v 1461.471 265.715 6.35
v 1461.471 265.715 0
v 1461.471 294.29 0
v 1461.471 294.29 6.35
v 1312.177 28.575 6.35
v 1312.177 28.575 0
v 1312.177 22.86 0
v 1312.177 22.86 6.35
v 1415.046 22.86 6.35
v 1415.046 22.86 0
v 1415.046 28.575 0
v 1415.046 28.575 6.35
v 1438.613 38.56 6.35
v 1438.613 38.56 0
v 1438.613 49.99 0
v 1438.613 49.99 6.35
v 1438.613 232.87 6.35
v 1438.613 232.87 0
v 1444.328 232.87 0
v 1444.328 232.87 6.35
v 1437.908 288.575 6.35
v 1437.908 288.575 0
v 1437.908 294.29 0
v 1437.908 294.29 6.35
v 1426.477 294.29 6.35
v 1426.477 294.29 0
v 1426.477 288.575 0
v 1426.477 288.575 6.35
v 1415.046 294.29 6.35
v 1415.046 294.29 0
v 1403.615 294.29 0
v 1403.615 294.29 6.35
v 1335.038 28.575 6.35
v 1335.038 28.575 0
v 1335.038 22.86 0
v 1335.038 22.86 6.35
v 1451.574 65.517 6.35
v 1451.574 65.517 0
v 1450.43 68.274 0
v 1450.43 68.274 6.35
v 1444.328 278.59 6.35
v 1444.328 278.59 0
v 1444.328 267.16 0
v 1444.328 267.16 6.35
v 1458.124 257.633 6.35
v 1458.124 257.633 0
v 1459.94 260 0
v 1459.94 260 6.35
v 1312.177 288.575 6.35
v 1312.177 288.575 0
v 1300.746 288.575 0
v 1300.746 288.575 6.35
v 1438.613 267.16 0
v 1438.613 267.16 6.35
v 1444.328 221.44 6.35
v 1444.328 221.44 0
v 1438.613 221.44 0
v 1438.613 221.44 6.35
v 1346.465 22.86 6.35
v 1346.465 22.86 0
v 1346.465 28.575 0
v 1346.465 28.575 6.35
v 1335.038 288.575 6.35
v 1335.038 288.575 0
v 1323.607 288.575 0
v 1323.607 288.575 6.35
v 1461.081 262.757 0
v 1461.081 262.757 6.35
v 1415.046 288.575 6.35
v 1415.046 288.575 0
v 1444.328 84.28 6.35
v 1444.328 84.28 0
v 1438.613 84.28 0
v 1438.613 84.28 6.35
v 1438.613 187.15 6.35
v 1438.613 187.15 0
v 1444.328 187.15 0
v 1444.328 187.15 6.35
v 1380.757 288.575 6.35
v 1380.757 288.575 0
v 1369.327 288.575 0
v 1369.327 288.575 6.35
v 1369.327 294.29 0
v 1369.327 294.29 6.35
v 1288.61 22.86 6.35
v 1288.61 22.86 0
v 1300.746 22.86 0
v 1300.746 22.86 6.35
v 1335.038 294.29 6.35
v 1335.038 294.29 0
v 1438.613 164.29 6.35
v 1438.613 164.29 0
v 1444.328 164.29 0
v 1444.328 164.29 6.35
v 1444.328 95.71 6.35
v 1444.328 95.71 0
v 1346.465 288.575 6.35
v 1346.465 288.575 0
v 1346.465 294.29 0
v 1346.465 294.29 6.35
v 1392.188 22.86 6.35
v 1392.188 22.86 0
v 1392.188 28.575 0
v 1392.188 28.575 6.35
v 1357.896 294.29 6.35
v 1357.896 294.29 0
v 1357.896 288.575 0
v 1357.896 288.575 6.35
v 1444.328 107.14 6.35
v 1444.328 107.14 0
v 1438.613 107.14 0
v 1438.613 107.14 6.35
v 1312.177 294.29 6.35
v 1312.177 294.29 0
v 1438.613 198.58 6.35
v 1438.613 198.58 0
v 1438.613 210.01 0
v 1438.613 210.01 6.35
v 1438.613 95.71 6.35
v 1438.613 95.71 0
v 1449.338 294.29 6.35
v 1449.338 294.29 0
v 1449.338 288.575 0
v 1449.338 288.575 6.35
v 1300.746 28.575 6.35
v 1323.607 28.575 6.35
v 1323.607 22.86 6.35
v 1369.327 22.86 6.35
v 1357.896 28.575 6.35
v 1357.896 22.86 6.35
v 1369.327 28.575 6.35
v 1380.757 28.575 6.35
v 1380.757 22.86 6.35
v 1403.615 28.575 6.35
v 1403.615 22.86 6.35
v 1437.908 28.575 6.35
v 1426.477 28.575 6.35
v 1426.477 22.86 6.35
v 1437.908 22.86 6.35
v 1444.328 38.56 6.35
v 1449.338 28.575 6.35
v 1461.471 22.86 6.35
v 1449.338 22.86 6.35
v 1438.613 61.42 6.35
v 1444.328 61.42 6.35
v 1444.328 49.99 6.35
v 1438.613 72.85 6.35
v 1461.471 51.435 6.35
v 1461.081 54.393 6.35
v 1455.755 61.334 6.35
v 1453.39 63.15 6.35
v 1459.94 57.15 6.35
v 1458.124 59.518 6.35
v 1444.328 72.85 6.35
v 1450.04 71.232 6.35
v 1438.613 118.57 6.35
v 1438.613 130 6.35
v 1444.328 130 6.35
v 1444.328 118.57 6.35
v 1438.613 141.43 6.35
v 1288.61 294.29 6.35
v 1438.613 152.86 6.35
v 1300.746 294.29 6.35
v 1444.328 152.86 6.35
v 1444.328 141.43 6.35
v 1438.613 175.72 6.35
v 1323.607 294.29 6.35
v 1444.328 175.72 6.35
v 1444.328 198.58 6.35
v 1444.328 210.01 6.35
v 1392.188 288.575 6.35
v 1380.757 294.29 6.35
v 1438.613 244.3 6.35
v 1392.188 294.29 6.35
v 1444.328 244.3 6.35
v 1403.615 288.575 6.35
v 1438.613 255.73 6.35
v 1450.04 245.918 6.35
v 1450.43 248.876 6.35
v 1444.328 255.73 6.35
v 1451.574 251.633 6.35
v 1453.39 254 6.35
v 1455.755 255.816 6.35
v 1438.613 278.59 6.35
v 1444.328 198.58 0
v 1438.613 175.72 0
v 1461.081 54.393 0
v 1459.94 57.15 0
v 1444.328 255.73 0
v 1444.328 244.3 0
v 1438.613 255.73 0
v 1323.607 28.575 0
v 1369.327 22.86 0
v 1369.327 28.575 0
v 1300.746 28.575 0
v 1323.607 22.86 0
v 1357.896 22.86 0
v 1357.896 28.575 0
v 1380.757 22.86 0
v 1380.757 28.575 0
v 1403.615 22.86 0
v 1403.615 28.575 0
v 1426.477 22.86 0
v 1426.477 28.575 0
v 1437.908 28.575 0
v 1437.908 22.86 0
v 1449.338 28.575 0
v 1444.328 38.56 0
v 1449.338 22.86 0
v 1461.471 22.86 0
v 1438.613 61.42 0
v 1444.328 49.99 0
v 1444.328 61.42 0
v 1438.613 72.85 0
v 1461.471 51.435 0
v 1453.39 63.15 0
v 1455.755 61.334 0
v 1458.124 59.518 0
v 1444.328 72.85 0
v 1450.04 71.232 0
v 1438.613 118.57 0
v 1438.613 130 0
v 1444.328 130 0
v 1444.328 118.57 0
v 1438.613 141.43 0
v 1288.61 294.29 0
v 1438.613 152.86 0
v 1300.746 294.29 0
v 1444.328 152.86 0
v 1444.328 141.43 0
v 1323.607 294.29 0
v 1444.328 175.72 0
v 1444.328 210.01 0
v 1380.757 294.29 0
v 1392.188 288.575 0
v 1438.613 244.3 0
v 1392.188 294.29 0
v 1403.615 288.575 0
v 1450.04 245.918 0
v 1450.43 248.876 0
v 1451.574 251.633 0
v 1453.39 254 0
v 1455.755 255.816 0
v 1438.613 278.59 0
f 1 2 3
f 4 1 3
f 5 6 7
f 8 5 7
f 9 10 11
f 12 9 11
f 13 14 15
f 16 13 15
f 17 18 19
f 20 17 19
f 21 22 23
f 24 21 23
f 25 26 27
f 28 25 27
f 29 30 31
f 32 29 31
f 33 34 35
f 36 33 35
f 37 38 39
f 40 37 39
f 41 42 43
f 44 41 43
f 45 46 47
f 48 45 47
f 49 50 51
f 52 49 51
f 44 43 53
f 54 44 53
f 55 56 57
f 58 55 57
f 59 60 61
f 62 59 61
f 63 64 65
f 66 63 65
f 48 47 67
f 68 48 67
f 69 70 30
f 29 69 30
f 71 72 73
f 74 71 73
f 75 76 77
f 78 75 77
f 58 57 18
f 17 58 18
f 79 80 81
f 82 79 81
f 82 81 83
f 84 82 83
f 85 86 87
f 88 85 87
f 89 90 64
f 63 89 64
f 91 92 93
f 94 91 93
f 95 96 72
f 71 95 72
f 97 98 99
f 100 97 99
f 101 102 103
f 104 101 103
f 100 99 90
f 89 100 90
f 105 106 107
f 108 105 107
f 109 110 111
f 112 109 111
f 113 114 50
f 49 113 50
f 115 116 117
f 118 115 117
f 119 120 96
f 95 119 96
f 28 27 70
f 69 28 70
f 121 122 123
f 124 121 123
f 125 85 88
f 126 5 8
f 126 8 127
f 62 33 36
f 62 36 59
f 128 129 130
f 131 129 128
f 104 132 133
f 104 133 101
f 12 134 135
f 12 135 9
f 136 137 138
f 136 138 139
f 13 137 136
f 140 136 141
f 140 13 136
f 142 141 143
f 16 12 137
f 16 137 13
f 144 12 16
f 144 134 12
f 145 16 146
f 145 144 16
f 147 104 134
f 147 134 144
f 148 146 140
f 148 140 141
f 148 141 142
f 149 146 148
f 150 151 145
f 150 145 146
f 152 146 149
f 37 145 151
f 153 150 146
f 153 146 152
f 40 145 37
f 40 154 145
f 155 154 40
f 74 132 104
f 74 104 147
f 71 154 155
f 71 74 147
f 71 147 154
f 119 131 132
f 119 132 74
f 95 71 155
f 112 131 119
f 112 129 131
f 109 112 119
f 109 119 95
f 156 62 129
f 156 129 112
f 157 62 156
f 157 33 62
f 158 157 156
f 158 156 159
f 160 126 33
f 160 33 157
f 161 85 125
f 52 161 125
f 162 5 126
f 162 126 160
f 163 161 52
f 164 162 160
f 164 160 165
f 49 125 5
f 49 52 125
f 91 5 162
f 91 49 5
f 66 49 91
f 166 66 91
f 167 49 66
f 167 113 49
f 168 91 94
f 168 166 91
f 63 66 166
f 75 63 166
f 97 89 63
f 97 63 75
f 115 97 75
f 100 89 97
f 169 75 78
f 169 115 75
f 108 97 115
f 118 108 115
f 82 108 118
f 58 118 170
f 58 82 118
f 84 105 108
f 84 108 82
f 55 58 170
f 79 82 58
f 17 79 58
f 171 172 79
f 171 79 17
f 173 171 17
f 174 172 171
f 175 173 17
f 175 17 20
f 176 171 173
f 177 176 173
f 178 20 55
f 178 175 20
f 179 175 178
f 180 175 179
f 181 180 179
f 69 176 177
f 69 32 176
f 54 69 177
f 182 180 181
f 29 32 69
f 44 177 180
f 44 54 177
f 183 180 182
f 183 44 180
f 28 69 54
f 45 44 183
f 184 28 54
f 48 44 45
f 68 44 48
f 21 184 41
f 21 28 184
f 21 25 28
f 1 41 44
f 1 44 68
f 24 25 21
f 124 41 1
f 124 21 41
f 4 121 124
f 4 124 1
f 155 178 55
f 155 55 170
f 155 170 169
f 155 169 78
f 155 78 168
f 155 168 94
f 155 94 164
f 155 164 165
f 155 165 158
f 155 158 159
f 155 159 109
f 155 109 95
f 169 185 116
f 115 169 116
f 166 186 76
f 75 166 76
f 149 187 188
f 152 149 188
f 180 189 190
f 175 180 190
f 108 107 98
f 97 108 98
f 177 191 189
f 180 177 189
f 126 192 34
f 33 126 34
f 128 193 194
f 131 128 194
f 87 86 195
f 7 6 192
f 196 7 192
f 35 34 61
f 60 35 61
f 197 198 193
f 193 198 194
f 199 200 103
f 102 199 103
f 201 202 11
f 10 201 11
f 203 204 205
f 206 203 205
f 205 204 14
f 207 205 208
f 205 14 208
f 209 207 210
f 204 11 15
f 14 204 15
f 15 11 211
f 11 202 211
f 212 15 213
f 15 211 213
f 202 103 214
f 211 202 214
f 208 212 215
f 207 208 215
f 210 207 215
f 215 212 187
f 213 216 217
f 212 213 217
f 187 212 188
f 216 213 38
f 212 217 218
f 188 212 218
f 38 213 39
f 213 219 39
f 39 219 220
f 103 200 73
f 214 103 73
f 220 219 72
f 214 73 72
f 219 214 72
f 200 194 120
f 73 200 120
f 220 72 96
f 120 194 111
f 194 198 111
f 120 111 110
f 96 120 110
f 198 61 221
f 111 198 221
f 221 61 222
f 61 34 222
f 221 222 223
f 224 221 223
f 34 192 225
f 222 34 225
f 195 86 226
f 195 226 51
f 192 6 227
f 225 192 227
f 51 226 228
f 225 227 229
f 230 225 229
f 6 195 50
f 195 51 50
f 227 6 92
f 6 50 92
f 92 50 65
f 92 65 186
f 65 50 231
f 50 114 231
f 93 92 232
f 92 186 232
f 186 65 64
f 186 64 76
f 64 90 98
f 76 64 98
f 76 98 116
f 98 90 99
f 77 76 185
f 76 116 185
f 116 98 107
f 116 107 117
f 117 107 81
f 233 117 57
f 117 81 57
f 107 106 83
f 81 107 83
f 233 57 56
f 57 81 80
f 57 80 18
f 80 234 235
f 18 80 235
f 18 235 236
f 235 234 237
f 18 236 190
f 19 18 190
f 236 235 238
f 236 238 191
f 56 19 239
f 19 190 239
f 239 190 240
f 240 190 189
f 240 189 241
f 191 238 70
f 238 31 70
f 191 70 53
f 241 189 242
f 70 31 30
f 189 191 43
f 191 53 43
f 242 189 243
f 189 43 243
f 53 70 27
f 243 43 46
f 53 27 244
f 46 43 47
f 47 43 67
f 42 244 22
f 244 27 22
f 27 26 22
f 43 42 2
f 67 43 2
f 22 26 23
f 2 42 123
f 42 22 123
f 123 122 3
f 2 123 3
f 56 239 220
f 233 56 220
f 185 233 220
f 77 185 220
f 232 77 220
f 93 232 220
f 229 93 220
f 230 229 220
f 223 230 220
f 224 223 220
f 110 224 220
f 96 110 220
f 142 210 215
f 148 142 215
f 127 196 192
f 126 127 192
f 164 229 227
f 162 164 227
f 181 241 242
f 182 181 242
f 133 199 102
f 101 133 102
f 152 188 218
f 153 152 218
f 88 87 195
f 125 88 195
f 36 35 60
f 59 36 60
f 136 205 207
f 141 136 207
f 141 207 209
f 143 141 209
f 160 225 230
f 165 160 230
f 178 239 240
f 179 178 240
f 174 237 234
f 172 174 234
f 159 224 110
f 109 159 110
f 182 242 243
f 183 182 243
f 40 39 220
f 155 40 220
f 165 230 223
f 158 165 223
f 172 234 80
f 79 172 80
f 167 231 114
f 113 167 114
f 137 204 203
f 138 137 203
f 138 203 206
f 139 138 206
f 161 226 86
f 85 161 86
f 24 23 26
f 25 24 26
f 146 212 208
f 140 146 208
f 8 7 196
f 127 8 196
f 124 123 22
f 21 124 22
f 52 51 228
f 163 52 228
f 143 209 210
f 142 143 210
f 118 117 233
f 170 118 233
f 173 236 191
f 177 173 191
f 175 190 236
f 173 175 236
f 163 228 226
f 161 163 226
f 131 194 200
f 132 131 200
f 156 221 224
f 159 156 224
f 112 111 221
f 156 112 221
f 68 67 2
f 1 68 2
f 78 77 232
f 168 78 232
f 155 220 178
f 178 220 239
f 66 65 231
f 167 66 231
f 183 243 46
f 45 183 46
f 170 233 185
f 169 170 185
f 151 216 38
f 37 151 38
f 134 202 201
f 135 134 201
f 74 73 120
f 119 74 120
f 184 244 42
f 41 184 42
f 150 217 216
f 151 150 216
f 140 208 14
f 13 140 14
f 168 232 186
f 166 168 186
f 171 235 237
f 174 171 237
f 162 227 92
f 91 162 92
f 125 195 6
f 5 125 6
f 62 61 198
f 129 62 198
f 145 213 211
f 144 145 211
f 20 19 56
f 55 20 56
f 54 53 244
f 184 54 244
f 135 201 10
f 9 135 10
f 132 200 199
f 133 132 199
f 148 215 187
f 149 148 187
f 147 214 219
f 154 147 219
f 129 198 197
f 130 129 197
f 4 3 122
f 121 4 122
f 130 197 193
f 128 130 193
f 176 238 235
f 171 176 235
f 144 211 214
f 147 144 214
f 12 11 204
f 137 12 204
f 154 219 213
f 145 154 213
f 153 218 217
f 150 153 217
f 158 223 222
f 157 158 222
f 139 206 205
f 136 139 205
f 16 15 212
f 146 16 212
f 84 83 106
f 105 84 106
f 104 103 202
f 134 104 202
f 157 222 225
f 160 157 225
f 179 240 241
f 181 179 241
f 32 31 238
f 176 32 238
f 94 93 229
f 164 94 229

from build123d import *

# Parameters (mm, degrees)
BOSS_EXTRUDE1_DEPTH = 6.35


with BuildPart() as part:
    # Model → Boss-Extrude1 (new body)
    with BuildSketch(Plane.XY):
        Polygon((1288.610132665, 22.860238699), (1300.745973293, 22.860238699), (1300.745973293, 28.575245224), (1312.176695005, 28.575245224), (1312.176695005, 22.860238699), (1323.607416717, 22.860238699), (1323.607416717, 28.575245224), (1335.038138429, 28.575245224), (1335.038138429, 22.860238699), (1346.46531683, 22.860238699), (1346.46531683, 28.575245224), (1357.896038543, 28.575245224), (1357.896038543, 22.860238699), (1369.326760255, 22.860238699), (1369.326760255, 28.575245224), (1380.757481967, 28.575245224), (1380.757481967, 22.860238699), (1392.188203679, 22.860238699), (1392.188203679, 28.575245224), (1403.615382081, 28.575245224), (1403.615382081, 22.860238699), (1415.046103793, 22.860238699), (1415.046103793, 28.575245224), (1426.476825505, 28.575245224), (1426.476825505, 22.860238699), (1437.907547217, 22.860238699), (1437.907547217, 28.575245224), (1449.33826893, 28.575245224), (1449.33826893, 22.860238699), (1461.470566246, 22.860238699), (1461.470566246, 28.575245224), (1461.470566246, 51.435413056), (1461.081244935, 54.393369189), (1459.939855837, 57.150419581), (1458.123908882, 59.517571103), (1455.75520539, 61.334361366), (1453.389602295, 63.150485487), (1451.574098254, 65.517240157), (1450.429608758, 68.274290549), (1450.039844534, 71.232246682), (1450.039844534, 245.918194159), (1450.429608758, 248.876284937), (1451.574098254, 251.633200684), (1453.389602295, 254.00013252), (1455.75520539, 255.816433806), (1458.123908882, 257.633089424), (1459.939855837, 260.000375591), (1461.081244935, 262.757291337), (1461.470566246, 265.715382116), (1461.470566246, 288.575408216), (1461.470566246, 294.290414741), (1449.33826893, 294.290414741), (1449.33826893, 288.575408216), (1437.907547217, 288.575408216), (1437.907547217, 294.290414741), (1426.476825505, 294.290414741), (1426.476825505, 288.575408216), (1415.046103793, 288.575408216), (1415.046103793, 294.290414741), (1403.615382081, 294.290414741), (1403.615382081, 288.575408216), (1392.188203679, 288.575408216), (1392.188203679, 294.290414741), (1380.757481967, 294.290414741), (1380.757481967, 288.575408216), (1369.326760255, 288.575408216), (1369.326760255, 294.290414741), (1357.896038543, 294.290414741), (1357.896038543, 288.575408216), (1346.46531683, 288.575408216), (1346.46531683, 294.290414741), (1335.038138429, 294.290414741), (1335.038138429, 288.575408216), (1323.607416717, 288.575408216), (1323.607416717, 294.290414741), (1312.176695005, 294.290414741), (1312.176695005, 288.575408216), (1300.745973293, 288.575408216), (1300.745973293, 294.290414741), (1288.610132665, 294.290414741), (1288.610132665, 288.575408216), (1288.610132665, 28.575245224), align=None)
        Polygon((1444.328026989, 44.27508992), (1444.328026989, 38.560083395), (1438.612666133, 38.560083395), (1438.612666133, 49.990096445), (1444.328026989, 49.990096445), align=None, mode=Mode.SUBTRACT)
        Polygon((1444.328026989, 67.13511602), (1444.328026989, 61.420109495), (1438.612666133, 61.420109495), (1438.612666133, 72.850122545), (1444.328026989, 72.850122545), align=None, mode=Mode.SUBTRACT)
        Polygon((1444.328026989, 89.99514212), (1444.328026989, 84.280135595), (1438.612666133, 84.280135595), (1438.612666133, 95.710148645), (1444.328026989, 95.710148645), align=None, mode=Mode.SUBTRACT)
        Polygon((1444.328026989, 112.85516822), (1444.328026989, 107.140161695), (1438.612666133, 107.140161695), (1438.612666133, 118.570174745), (1444.328026989, 118.570174745), align=None, mode=Mode.SUBTRACT)
        Polygon((1444.328026989, 135.71519432), (1444.328026989, 130.000187795), (1438.612666133, 130.000187795), (1438.612666133, 141.430200846), (1444.328026989, 141.430200846), align=None, mode=Mode.SUBTRACT)
        Polygon((1444.328026989, 158.575220421), (1444.328026989, 152.860213896), (1438.612666133, 152.860213896), (1438.612666133, 164.290226946), (1444.328026989, 164.290226946), align=None, mode=Mode.SUBTRACT)
        Polygon((1444.328026989, 181.435246521), (1444.328026989, 175.720239996), (1438.612666133, 175.720239996), (1438.612666133, 187.150253046), (1444.328026989, 187.150253046), align=None, mode=Mode.SUBTRACT)
        Polygon((1444.328026989, 204.295272621), (1444.328026989, 198.580266096), (1438.612666133, 198.580266096), (1438.612666133, 210.010279146), (1444.328026989, 210.010279146), align=None, mode=Mode.SUBTRACT)
        Polygon((1444.328026989, 227.155298721), (1444.328026989, 221.440292196), (1438.612666133, 221.440292196), (1438.612666133, 232.870305246), (1444.328026989, 232.870305246), align=None, mode=Mode.SUBTRACT)
        Polygon((1444.328026989, 250.015324821), (1444.328026989, 244.300318296), (1438.612666133, 244.300318296), (1438.612666133, 255.730331346), (1444.328026989, 255.730331346), align=None, mode=Mode.SUBTRACT)
        Polygon((1444.328026989, 272.875350921), (1444.328026989, 267.160344396), (1438.612666133, 267.160344396), (1438.612666133, 278.590357446), (1444.328026989, 278.590357446), align=None, mode=Mode.SUBTRACT)
    extrude(amount=BOSS_EXTRUDE1_DEPTH)


solid = part.part
